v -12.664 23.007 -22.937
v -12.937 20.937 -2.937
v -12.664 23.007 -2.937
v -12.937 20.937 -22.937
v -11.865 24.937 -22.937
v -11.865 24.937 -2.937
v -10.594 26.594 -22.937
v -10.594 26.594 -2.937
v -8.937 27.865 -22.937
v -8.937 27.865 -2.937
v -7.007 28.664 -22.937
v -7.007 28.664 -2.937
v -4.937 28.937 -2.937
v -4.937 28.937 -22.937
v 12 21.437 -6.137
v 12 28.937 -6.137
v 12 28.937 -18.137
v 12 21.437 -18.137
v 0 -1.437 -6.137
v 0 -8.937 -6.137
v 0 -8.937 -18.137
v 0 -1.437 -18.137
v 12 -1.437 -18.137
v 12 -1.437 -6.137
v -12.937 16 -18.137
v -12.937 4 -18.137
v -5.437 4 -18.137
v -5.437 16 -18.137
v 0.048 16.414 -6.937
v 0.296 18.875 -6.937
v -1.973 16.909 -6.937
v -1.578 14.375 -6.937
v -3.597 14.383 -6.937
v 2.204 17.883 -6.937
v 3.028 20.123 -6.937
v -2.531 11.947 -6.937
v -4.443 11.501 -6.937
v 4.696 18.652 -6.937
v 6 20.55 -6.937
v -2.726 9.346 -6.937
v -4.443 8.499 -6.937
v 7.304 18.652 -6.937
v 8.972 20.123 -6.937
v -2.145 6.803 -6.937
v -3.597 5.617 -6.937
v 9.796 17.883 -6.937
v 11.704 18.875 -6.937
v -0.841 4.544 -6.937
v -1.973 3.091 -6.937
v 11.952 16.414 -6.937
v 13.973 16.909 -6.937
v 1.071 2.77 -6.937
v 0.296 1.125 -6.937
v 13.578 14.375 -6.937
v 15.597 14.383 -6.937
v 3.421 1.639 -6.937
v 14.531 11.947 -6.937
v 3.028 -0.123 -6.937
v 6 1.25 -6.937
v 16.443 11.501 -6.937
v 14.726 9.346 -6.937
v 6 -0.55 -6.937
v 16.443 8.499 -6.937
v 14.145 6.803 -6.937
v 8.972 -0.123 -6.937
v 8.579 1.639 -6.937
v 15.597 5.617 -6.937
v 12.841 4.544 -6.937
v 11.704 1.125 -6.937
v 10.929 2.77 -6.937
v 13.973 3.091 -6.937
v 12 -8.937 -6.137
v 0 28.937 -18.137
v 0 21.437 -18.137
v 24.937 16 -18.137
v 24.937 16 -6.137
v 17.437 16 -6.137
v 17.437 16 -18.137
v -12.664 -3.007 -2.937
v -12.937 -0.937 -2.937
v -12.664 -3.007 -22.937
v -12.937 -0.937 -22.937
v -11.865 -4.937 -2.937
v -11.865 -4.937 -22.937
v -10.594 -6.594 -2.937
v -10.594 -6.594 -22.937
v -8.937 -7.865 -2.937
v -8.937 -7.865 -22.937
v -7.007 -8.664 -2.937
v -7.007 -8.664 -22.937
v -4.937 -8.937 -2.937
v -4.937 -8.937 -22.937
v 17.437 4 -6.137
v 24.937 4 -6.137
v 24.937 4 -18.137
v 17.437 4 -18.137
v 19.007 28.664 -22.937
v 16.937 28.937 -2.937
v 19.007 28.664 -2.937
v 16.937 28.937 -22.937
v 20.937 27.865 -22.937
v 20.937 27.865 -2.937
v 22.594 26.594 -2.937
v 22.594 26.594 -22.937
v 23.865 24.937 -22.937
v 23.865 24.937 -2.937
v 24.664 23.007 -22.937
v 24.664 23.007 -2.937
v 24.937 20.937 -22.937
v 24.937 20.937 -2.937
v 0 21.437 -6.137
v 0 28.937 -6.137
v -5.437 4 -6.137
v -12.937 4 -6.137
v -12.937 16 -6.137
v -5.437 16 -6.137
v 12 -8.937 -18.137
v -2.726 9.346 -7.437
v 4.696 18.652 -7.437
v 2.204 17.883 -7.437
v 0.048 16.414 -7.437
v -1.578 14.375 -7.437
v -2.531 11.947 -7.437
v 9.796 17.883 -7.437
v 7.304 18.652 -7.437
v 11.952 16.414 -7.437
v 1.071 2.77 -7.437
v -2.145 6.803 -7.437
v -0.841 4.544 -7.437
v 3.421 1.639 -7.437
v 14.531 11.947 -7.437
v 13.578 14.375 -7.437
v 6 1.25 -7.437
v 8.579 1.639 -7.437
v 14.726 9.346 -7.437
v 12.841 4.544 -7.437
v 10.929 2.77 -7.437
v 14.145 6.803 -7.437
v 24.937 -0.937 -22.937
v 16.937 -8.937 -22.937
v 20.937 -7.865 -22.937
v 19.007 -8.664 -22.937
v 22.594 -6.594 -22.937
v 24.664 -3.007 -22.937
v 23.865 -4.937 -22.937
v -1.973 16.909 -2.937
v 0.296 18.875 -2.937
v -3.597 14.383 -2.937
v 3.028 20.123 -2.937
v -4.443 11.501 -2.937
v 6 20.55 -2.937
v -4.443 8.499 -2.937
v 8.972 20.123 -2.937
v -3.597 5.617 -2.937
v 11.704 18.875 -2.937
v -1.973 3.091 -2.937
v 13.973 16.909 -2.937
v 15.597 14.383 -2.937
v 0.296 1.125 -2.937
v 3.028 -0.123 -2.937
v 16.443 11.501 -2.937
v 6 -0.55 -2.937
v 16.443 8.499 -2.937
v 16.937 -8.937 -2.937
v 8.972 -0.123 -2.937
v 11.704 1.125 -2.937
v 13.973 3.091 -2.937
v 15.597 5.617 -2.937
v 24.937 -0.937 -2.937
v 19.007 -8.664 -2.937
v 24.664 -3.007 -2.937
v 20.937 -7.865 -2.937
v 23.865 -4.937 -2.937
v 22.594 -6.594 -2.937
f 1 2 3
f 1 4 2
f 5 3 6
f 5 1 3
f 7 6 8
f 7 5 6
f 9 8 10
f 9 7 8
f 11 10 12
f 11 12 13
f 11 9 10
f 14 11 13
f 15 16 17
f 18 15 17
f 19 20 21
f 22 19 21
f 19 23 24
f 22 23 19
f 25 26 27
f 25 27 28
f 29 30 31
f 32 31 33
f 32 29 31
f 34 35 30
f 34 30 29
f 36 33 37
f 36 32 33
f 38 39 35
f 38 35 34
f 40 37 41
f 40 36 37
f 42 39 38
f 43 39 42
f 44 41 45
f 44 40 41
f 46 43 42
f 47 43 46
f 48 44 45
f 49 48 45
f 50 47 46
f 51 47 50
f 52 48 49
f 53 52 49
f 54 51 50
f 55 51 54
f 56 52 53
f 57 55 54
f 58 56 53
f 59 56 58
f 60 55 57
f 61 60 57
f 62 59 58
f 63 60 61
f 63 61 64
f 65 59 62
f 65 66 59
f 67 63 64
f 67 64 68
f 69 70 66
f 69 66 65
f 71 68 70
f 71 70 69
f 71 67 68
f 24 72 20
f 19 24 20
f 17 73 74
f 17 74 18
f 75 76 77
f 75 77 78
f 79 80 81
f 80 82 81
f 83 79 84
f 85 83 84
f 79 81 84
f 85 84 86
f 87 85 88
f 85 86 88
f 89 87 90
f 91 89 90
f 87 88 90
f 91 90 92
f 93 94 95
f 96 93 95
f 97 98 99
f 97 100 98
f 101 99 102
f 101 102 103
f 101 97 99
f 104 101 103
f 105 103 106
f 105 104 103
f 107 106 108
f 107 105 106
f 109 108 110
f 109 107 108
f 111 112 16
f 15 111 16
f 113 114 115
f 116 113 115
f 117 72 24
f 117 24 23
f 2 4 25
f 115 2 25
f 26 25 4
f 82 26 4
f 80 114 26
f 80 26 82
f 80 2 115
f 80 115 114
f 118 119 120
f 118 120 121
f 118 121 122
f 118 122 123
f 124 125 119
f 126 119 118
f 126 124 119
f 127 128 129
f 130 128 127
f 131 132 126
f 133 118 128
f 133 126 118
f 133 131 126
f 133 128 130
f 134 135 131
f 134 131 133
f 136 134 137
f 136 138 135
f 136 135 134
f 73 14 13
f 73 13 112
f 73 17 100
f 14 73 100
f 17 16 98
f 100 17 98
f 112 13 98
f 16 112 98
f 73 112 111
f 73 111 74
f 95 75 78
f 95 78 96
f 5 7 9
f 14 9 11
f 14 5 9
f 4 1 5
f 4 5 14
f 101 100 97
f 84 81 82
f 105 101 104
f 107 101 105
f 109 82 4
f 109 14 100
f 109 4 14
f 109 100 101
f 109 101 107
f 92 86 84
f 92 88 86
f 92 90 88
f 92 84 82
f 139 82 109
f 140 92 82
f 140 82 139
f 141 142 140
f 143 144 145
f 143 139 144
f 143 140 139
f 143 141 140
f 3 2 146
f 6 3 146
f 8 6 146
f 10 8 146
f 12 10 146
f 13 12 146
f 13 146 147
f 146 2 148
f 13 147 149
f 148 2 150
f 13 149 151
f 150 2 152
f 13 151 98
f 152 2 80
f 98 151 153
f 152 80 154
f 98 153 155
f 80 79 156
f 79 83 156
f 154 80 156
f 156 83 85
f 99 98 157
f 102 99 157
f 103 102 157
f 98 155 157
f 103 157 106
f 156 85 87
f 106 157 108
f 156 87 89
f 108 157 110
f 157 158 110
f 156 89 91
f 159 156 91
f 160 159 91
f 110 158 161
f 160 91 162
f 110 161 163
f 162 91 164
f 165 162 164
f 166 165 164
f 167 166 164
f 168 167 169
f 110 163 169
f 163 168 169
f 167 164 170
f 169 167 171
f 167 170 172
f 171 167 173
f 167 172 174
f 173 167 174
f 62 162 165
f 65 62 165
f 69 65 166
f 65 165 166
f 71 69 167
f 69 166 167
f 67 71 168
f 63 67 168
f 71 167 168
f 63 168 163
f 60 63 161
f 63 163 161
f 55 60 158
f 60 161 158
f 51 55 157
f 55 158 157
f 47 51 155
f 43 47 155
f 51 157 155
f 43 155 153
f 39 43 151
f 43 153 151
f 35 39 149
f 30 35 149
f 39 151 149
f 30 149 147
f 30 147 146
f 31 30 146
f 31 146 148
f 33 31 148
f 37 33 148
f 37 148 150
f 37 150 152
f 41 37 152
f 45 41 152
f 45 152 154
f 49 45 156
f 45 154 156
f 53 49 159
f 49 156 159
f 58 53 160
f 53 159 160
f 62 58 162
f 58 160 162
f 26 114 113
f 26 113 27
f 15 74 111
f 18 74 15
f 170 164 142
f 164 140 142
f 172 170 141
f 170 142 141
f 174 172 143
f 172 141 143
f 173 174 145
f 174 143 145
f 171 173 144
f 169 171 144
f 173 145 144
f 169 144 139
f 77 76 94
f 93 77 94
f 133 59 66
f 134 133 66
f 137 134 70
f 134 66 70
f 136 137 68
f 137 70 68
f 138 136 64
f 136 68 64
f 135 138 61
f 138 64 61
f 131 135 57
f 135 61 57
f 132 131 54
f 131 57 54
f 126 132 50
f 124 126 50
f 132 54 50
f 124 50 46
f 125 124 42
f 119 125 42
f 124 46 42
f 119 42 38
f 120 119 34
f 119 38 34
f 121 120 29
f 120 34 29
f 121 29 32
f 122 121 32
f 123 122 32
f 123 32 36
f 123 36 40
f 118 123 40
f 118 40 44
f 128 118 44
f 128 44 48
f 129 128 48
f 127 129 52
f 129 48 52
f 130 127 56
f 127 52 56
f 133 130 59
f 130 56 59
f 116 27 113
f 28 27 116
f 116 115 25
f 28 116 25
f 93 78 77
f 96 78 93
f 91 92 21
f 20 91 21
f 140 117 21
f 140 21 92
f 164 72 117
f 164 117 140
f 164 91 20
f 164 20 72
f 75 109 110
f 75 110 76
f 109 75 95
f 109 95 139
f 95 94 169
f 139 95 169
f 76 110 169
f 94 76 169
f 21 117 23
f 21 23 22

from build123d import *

# Parameters (mm, degrees)
SKIZZE1_W                          = 37.873435046
SKIZZE1_H                          = 37.873435047
AUFSATZ_LINEAR_AUSTRAGEN1_DEPTH    = 20
SKIZZE2_R                          = 10.55
SCHNITT_LINEAR_AUSTRAGEN1_DEPTH    = 4
SKIZZE3_W                          = 12
SKIZZE3_H                          = 12
SCHNITT_LINEAR_AUSTRAGEN3_DEPTH    = 7.5
VERRUNDUNG1_R                      = 8
KREISMUSTER1_COUNT                 = 4
SKIZZE4_R                          = 8.75
SCHNITT_LINEAR_AUSTRAGEN4_DEPTH    = 0.5
K_RPER_VERSCHIEBEN_KOPIEREN1_ANGLE = 90


with BuildPart() as part:
    # Skizze1 → Aufsatz-Linear austragen1 (new body)
    with BuildSketch(Plane(origin=(0, 0, 0), x_dir=(1, 0, 0), z_dir=(0, 1, 0))):
        with Locations((6, 12.936717524)):
            Rectangle(SKIZZE1_W, SKIZZE1_H)
    extrude(amount=AUFSATZ_LINEAR_AUSTRAGEN1_DEPTH)

    # Skizze2 → Schnitt-Linear austragen1 (cut)
    with BuildSketch(Plane.XZ):
        with Locations(Location((6, -12.936717523, 0), (0, 0, 270))):
            Circle(SKIZZE2_R)
    extrude(amount=-SCHNITT_LINEAR_AUSTRAGEN1_DEPTH, mode=Mode.SUBTRACT)

    # Skizze3 → Schnitt-Linear austragen3 (cut)
    with BuildSketch(Plane.XY.offset(6)):
        with Locations((6, 9.2)):
            Rectangle(SKIZZE3_W, SKIZZE3_H)
    schnitt_linear_austragen3 = extrude(amount=-SCHNITT_LINEAR_AUSTRAGEN3_DEPTH, mode=Mode.SUBTRACT)

    # Verrundung1
    verrundung1_edges = [part.edges().sort_by_distance(p)[0] for p in [
        (24.936717523, 10, -31.873435047),
        (24.936717523, 10, 6),
        (-12.936717523, 10, 6),
        (-12.936717523, 10, -31.873435047),
    ]]
    fillet(verrundung1_edges, radius=VERRUNDUNG1_R)

    # Kreismuster1: Schnitt-Linear austragen3 ×4 about axis
    kreismuster1_axis = Axis((6, 0, -12.936717523), (0, 1, 0))
    for i in range(1, KREISMUSTER1_COUNT):
        add(schnitt_linear_austragen3.rotate(kreismuster1_axis, i * 360 / KREISMUSTER1_COUNT), mode=Mode.SUBTRACT)

    # Skizze4 → Schnitt-Linear austragen4 (cut)
    with BuildSketch(Plane.XZ.offset(-4)):
        with Locations(Location((6, -12.936717523, 0), (0, 0, 270))):
            Circle(SKIZZE4_R)
    extrude(amount=-SCHNITT_LINEAR_AUSTRAGEN4_DEPTH, mode=Mode.SUBTRACT)


with BuildPart() as part_1:
    # Körper-Verschieben/Kopieren1: moved
    add(part.part.rotate(Axis((0, 10, -12.936717523), (-1, 0, 0)), K_RPER_VERSCHIEBEN_KOPIEREN1_ANGLE))


solid = part_1.part
